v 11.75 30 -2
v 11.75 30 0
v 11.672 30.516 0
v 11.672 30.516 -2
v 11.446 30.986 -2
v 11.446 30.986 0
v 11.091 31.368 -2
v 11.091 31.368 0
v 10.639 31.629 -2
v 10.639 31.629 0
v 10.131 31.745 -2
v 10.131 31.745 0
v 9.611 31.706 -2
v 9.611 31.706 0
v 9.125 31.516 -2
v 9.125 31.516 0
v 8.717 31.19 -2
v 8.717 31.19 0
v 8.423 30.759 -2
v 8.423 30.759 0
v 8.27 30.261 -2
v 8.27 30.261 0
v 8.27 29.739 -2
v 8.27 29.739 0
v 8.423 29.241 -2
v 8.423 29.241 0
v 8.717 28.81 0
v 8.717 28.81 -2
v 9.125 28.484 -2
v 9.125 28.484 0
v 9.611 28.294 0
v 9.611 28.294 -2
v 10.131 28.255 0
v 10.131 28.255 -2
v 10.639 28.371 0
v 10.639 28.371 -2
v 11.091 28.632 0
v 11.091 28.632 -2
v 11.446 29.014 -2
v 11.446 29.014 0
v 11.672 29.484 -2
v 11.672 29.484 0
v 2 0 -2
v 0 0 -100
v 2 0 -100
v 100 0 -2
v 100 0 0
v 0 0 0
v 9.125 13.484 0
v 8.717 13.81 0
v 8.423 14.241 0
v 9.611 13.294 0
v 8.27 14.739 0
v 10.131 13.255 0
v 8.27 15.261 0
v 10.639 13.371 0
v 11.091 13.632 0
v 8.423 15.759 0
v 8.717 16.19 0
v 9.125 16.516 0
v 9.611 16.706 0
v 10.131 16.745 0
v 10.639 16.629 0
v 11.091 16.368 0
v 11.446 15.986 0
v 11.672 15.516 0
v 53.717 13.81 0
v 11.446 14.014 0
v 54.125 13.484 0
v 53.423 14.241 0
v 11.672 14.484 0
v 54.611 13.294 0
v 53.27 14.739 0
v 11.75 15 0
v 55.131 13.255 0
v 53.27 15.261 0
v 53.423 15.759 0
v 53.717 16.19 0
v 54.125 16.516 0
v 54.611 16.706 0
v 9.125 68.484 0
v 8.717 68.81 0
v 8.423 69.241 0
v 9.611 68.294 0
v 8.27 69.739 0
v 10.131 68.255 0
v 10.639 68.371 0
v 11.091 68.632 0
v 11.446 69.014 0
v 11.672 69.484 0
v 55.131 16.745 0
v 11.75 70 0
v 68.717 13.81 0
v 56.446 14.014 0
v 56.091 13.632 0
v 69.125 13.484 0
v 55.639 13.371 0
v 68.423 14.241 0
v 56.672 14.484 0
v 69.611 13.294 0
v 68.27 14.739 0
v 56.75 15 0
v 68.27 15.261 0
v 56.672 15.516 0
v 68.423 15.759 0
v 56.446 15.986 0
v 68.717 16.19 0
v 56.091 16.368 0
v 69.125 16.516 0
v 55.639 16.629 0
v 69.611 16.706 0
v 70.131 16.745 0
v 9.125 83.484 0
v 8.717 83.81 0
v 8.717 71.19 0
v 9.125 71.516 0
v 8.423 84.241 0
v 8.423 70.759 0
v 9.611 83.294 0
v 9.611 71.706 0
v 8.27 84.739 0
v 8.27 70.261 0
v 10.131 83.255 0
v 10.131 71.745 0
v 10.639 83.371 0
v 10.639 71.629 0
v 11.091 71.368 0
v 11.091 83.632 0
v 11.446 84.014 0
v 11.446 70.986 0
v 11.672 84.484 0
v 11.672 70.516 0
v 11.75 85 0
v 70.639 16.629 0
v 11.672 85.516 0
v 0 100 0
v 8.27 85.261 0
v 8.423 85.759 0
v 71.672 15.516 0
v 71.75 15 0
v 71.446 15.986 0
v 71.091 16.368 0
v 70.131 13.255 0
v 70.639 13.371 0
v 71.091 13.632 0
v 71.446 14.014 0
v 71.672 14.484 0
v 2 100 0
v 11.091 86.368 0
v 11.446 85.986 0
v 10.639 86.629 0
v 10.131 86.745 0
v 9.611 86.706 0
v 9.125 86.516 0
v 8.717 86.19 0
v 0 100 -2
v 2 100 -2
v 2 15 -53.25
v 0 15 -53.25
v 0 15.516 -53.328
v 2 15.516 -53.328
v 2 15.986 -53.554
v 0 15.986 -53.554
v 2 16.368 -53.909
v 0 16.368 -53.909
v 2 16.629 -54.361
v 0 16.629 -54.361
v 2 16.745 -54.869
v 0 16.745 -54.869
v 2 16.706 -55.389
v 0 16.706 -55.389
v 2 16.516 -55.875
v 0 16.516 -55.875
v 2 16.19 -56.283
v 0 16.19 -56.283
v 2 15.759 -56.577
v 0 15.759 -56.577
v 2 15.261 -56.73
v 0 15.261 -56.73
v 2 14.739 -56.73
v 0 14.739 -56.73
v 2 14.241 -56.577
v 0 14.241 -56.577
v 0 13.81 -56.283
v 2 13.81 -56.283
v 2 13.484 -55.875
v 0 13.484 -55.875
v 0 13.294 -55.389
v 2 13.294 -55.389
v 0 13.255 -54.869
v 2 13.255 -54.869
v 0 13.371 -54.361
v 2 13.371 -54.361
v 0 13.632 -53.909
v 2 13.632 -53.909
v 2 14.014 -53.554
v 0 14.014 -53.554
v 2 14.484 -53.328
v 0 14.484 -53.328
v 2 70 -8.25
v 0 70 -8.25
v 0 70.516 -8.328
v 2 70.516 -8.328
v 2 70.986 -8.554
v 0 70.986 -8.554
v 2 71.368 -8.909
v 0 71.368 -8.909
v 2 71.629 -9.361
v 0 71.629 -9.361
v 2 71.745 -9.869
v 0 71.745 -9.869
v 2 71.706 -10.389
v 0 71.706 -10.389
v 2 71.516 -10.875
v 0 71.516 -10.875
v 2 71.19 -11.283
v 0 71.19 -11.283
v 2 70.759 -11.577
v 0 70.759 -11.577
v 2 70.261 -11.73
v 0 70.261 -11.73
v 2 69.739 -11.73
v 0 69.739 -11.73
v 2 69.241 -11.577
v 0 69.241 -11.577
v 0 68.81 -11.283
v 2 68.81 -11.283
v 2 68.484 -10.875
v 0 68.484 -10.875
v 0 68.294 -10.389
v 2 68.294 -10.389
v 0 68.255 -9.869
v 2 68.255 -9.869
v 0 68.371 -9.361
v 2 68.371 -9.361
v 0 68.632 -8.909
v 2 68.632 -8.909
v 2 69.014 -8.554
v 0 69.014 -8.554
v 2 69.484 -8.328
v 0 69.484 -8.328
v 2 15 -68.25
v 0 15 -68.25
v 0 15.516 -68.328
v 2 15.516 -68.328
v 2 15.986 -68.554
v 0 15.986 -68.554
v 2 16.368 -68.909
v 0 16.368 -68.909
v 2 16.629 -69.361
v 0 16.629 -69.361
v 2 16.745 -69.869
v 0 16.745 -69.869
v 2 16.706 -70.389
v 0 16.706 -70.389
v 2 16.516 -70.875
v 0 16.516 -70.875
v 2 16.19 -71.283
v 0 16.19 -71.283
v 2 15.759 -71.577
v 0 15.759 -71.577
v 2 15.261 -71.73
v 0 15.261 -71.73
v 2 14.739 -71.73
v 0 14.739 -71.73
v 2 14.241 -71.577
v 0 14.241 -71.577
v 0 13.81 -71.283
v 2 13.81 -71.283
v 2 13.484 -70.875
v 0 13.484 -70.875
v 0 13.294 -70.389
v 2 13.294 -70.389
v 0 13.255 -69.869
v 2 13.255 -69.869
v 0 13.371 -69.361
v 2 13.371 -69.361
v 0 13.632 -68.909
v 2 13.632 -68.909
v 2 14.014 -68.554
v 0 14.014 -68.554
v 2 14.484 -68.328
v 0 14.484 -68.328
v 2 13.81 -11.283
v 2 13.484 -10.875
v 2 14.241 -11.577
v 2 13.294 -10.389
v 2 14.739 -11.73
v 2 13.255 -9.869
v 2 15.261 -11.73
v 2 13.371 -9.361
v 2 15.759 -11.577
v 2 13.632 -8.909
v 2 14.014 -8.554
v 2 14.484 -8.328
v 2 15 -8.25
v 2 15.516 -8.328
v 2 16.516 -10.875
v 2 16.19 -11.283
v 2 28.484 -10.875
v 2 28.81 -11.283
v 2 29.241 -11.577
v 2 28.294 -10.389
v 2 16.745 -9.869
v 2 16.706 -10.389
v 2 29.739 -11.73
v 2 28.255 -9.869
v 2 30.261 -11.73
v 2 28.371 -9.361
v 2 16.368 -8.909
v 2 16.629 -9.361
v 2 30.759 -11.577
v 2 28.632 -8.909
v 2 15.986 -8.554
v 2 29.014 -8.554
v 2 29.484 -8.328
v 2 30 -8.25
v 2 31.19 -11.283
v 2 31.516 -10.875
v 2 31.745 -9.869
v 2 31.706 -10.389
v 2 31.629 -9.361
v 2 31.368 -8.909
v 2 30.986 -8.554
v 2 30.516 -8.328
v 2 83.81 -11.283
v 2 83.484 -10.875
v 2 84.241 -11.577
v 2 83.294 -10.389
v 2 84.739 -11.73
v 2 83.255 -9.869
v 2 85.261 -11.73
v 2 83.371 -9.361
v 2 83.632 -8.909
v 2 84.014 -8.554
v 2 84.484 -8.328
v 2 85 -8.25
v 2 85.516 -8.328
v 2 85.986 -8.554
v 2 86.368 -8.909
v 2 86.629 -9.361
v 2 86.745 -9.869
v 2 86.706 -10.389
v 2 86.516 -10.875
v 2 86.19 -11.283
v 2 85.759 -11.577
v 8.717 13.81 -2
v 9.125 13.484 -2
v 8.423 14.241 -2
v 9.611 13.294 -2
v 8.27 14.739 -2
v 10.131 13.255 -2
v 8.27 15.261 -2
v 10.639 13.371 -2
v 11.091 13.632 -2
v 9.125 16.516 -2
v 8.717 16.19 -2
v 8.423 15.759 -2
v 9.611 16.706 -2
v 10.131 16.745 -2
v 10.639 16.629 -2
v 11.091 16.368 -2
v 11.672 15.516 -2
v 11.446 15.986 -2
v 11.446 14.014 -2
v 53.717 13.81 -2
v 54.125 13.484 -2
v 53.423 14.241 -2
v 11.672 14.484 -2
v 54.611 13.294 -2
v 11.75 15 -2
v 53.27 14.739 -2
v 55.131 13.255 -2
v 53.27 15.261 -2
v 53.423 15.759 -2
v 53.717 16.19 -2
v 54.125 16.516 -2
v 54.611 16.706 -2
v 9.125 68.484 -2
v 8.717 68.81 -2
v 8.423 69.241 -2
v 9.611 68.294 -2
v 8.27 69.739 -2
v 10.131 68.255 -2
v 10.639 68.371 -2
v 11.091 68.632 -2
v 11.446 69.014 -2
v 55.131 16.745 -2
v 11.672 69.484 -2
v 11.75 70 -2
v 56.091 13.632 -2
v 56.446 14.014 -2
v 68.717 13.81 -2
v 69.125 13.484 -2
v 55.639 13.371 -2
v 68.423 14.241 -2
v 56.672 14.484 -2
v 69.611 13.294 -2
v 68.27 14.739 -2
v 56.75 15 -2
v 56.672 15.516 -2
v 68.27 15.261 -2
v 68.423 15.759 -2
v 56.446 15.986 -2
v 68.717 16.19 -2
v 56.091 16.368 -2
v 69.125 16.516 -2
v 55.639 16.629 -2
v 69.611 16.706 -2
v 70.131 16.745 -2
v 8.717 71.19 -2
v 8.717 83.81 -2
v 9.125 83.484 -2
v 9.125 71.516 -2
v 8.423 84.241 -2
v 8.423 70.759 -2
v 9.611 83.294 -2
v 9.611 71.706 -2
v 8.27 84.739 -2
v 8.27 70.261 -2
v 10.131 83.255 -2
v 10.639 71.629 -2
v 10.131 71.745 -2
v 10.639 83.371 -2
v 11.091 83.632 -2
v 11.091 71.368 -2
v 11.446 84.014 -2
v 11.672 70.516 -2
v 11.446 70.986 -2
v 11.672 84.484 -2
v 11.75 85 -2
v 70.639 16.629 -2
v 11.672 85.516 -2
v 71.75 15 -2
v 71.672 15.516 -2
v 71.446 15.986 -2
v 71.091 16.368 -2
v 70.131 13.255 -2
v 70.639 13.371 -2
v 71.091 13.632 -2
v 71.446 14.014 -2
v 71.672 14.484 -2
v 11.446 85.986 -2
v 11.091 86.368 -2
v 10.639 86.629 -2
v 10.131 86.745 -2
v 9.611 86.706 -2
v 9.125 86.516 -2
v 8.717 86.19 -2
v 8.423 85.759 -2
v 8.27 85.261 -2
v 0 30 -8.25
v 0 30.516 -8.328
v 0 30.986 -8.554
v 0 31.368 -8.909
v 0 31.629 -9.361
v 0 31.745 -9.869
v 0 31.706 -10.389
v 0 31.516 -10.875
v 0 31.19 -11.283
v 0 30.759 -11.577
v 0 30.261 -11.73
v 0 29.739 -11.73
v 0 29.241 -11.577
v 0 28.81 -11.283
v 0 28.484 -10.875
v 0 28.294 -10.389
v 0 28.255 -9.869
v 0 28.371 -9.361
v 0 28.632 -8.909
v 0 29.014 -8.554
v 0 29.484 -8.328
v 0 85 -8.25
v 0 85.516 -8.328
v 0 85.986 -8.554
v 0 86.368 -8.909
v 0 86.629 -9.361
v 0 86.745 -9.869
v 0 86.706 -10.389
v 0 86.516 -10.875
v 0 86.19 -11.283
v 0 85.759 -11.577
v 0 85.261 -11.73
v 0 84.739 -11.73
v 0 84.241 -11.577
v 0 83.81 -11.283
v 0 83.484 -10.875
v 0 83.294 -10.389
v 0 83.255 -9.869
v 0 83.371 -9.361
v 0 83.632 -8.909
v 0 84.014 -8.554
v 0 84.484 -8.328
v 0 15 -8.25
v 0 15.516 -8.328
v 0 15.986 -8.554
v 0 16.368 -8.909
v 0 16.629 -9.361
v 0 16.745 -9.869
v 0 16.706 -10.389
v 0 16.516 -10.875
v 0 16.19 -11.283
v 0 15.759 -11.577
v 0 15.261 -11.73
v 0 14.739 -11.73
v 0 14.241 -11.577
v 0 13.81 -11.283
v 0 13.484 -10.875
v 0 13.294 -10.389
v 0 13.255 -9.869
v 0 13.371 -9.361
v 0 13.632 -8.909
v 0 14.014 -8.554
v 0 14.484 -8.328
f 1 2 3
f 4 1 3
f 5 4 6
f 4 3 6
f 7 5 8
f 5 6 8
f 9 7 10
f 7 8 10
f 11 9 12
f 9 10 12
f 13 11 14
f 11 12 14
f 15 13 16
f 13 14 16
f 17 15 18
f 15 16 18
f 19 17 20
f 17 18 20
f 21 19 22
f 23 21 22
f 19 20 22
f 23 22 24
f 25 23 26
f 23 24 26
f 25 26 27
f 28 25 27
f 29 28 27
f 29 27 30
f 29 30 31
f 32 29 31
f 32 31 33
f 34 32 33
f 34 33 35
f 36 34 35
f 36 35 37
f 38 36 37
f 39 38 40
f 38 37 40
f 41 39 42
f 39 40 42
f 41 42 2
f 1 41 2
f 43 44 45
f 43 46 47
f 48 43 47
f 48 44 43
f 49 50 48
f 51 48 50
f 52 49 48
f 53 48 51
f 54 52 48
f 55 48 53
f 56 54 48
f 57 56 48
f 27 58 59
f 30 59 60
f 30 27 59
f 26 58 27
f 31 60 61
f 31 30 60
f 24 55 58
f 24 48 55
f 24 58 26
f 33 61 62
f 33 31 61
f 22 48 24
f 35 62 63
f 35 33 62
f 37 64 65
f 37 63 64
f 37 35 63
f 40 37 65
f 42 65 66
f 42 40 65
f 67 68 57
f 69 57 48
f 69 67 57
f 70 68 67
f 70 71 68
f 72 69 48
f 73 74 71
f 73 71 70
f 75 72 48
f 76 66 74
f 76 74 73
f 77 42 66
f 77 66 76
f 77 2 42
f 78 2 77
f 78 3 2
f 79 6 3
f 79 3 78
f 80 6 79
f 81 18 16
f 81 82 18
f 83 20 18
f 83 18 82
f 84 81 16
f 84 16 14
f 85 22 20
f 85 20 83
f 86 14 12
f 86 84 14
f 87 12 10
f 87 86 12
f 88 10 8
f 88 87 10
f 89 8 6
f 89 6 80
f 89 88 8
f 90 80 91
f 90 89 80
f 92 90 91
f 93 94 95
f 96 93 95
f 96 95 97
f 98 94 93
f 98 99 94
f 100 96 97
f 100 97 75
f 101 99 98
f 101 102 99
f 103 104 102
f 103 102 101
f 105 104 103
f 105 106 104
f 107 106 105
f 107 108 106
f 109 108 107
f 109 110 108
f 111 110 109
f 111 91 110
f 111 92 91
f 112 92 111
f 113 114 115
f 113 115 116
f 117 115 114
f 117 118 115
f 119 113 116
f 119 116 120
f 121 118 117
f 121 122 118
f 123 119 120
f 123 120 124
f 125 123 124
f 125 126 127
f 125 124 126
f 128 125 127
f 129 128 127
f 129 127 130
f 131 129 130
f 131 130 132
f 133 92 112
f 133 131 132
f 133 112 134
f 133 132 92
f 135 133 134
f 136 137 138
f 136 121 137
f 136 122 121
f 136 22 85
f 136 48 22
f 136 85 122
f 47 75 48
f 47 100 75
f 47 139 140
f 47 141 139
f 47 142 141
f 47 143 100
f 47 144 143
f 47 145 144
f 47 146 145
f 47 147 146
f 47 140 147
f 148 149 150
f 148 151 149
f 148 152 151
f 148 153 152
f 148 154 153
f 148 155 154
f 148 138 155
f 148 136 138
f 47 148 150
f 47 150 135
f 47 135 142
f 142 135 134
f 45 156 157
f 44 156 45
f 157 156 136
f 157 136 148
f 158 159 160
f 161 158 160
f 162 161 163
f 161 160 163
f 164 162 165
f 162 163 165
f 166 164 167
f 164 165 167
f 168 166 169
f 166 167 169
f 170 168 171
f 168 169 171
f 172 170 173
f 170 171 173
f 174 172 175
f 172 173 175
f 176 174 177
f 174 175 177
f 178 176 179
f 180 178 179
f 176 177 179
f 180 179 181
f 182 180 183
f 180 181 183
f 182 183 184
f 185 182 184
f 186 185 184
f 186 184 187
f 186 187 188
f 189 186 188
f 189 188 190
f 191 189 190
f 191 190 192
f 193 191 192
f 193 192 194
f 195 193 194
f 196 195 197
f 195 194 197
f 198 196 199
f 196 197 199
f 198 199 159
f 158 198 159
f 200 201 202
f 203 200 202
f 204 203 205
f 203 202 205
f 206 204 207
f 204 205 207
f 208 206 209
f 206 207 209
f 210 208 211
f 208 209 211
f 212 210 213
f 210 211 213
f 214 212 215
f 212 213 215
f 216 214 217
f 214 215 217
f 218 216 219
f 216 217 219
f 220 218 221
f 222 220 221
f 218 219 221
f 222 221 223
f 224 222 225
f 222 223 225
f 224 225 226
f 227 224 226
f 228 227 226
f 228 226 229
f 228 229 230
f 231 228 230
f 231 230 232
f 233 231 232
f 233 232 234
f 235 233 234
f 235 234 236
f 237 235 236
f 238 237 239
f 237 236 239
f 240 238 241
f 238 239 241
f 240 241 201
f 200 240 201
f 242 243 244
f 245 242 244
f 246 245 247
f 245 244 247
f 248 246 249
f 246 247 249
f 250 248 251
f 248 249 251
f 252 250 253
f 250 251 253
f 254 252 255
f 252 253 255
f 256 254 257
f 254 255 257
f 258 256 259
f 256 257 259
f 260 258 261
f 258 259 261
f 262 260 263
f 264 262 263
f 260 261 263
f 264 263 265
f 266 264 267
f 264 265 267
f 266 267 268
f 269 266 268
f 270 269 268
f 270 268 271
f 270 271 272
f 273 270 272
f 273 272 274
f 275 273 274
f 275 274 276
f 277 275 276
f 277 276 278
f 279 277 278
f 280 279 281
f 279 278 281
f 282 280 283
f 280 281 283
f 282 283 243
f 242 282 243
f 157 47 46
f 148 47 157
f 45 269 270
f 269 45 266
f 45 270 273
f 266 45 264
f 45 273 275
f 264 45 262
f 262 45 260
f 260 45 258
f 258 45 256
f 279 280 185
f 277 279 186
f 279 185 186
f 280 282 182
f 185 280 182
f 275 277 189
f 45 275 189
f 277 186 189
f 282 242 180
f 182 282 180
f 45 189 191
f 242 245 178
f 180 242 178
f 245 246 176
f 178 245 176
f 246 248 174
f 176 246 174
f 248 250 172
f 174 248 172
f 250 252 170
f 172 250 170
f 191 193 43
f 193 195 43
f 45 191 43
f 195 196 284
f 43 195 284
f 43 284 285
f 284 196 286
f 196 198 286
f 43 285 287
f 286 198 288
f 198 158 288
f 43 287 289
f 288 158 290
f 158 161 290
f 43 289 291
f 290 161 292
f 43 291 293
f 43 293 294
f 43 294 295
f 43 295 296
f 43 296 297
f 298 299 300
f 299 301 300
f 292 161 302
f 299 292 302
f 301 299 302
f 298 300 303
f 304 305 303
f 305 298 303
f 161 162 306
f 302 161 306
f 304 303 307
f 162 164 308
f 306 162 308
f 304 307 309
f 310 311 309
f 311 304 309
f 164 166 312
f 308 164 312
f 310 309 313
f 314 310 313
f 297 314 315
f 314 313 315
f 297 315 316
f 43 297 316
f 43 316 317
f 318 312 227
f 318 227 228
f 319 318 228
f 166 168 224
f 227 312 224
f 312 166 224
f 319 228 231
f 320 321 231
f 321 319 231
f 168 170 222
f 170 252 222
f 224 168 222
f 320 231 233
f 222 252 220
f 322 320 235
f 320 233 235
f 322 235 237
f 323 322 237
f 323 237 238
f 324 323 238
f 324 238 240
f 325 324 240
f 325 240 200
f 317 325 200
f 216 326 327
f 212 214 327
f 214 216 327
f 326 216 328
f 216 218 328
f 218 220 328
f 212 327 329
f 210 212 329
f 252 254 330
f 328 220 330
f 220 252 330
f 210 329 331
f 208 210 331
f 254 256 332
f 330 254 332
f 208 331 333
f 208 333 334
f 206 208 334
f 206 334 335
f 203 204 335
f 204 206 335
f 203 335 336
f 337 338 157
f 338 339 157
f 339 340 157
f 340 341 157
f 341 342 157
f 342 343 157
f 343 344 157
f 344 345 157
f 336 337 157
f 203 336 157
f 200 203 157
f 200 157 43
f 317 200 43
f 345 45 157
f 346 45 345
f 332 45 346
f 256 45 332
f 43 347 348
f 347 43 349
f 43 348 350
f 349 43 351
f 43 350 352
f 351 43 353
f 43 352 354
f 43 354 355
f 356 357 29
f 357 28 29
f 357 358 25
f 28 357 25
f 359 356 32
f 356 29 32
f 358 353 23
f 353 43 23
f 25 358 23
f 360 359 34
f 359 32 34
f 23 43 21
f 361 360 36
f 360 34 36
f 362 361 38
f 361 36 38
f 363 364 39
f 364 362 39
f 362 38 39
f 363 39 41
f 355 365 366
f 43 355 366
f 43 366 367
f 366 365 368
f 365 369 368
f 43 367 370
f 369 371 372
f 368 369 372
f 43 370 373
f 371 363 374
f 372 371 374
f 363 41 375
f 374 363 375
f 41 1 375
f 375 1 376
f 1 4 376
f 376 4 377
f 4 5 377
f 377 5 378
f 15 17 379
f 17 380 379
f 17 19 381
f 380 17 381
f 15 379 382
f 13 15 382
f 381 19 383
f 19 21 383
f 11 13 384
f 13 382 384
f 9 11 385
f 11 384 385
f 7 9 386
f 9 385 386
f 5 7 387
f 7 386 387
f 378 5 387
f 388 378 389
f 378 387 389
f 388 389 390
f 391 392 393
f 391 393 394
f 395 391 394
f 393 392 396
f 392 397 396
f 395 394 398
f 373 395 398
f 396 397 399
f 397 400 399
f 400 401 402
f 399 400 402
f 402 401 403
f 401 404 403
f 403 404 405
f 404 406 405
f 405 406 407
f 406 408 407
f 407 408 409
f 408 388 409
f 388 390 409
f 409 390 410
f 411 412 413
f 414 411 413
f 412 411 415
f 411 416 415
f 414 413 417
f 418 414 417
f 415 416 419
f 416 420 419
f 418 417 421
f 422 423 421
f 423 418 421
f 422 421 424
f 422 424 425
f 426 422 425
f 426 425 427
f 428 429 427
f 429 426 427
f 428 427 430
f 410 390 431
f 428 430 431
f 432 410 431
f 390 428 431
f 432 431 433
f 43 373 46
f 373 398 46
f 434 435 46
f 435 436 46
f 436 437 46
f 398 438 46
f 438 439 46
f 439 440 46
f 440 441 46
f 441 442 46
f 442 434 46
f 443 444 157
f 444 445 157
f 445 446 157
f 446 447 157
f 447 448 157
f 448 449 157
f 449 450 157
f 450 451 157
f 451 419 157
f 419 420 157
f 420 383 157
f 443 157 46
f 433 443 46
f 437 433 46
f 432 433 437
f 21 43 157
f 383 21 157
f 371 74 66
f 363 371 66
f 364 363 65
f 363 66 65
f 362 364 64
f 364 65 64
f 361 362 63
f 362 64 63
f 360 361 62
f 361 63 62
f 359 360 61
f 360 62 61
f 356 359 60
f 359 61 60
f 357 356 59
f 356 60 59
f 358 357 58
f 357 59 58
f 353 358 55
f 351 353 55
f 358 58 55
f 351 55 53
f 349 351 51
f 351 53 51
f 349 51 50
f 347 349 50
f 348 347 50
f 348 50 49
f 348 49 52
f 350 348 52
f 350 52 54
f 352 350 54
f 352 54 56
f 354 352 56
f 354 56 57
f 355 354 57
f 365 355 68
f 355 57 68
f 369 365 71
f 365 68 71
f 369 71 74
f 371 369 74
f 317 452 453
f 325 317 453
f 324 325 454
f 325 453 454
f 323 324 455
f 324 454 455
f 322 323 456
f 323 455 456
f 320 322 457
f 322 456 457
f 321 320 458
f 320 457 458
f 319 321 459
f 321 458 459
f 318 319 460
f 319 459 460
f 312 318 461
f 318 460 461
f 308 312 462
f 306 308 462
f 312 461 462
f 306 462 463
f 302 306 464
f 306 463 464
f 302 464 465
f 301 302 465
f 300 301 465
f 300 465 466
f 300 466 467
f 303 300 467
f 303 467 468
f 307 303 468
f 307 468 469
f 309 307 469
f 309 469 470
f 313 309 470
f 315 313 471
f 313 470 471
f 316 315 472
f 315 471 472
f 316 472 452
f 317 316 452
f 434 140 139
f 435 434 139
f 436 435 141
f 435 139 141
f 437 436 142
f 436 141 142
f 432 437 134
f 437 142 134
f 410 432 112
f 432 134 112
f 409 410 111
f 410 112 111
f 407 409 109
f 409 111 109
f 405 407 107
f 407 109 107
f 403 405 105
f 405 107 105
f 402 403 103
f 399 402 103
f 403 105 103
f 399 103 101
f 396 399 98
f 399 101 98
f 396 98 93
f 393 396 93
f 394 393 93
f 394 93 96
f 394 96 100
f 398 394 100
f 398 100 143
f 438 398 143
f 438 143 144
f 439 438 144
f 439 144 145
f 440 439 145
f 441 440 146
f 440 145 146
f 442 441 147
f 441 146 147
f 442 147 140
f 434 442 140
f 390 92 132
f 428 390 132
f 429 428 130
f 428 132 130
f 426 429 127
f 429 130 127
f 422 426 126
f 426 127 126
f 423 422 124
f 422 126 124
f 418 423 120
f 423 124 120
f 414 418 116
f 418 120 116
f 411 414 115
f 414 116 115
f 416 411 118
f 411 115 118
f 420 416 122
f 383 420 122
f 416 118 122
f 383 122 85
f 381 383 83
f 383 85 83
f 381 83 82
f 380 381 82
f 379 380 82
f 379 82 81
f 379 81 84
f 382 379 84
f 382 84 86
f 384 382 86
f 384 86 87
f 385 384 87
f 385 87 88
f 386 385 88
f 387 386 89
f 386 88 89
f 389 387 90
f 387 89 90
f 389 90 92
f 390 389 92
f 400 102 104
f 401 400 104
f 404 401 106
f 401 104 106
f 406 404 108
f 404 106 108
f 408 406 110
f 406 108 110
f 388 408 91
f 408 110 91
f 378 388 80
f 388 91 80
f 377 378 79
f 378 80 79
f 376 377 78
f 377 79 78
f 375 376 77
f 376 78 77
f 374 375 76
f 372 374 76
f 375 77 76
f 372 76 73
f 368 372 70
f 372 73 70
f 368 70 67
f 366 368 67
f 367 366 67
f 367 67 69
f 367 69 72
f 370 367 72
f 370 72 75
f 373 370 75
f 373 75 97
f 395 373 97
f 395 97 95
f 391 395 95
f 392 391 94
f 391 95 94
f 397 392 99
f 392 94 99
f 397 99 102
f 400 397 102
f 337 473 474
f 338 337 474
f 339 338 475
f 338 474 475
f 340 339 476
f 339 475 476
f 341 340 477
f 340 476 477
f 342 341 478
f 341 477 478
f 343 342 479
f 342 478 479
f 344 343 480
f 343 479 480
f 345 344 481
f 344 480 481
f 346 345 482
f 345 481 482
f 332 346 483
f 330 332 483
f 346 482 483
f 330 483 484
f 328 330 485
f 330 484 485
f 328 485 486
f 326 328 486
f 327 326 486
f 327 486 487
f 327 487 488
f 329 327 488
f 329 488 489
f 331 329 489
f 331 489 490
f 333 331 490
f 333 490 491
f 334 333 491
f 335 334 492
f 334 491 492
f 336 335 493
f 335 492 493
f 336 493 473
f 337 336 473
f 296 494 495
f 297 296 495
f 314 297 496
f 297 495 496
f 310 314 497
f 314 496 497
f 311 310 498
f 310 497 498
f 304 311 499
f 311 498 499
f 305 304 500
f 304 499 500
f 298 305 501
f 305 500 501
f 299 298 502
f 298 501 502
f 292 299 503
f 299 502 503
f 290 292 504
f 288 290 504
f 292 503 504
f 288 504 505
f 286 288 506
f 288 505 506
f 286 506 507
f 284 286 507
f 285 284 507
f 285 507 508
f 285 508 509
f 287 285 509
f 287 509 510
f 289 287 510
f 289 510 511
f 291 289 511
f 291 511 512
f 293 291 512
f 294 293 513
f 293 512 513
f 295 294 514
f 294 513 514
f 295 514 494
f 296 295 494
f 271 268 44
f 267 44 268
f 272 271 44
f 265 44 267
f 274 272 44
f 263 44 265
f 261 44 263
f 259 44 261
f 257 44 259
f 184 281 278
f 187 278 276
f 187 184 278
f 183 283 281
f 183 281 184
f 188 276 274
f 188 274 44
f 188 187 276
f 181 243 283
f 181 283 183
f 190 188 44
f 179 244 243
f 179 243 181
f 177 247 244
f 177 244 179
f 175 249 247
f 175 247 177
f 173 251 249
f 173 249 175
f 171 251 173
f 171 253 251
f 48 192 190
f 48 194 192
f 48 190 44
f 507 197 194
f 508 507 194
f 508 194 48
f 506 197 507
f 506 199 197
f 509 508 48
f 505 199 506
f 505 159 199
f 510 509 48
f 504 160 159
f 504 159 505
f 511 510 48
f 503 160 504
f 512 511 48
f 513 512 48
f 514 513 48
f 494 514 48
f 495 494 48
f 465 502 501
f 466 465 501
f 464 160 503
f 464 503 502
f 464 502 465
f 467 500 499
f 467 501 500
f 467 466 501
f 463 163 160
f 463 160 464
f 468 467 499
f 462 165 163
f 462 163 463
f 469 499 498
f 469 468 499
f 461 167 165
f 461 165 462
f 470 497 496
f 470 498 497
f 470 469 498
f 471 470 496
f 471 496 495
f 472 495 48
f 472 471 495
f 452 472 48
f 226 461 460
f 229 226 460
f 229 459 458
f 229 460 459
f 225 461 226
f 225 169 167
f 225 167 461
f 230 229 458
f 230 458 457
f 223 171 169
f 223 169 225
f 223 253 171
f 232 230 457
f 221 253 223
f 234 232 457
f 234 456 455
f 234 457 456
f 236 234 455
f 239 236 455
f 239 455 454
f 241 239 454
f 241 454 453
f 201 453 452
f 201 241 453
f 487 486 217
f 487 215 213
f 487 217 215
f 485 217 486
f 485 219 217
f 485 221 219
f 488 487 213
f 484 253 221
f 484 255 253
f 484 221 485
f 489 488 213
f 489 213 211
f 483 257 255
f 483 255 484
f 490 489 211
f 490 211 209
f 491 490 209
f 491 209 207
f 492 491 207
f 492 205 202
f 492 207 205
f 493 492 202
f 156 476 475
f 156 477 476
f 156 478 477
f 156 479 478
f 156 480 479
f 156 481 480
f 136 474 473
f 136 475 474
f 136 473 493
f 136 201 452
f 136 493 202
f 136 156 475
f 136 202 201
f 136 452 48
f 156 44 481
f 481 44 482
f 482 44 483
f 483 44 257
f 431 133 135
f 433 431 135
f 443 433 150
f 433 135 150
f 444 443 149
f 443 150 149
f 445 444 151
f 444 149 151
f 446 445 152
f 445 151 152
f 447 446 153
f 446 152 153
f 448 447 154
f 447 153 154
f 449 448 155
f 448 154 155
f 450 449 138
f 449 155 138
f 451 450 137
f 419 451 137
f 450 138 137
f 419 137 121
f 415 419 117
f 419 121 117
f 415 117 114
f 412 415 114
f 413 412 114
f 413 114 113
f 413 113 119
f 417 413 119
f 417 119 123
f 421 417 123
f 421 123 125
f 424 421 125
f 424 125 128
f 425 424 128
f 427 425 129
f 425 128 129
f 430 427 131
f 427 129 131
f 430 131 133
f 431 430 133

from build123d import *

# Parameters (mm, degrees)
ESBO_O1_W                = 2
ESBO_O1_H                = 2
RESSALTO_EXTRUS_O1_DEPTH = 100
RESSALTO_EXTRUS_O2_DEPTH = 2
RESSALTO_EXTRUS_O3_DEPTH = 2
ESBO_O4_R                = 1.75
CORTE_EXTRUS_O1_DEPTH    = 2
ESBO_O5_R                = 1.75
CORTE_EXTRUS_O2_DEPTH    = 2


with BuildPart() as part:
    # Esboço1 → Ressalto-extrusão1 (new body)
    with BuildSketch(Plane(origin=(0, 0, 0), x_dir=(1, 0, 0), z_dir=(0, 1, 0))):
        with Locations((1, 1)):
            Rectangle(ESBO_O1_W, ESBO_O1_H)
    extrude(amount=RESSALTO_EXTRUS_O1_DEPTH)

    # Esboço2 → Ressalto-extrusão2 (add)
    with BuildSketch(Plane.XY):
        Polygon((2, 0), (100, 0), (2, 100), align=None)
    extrude(amount=-RESSALTO_EXTRUS_O2_DEPTH)

    # Esboço3 → Ressalto-extrusão3 (add)
    with BuildSketch(Plane.ZY):
        Polygon((-2, 0), (-2, 100), (-100, 0), align=None)
    extrude(amount=-RESSALTO_EXTRUS_O3_DEPTH)

    # Esboço4 → Corte-extrusão1 (cut)
    with BuildSketch(Plane.ZY):
        with Locations((-10, 15)):
            Circle(ESBO_O4_R)
        with Locations((-10, 30)):
            Circle(ESBO_O4_R)
        with Locations((-10, 85)):
            Circle(ESBO_O4_R)
        with Locations((-10, 70)):
            Circle(ESBO_O4_R)
        with Locations((-55, 15)):
            Circle(ESBO_O4_R)
        with Locations((-70, 15)):
            Circle(ESBO_O4_R)
    extrude(amount=-CORTE_EXTRUS_O1_DEPTH, mode=Mode.SUBTRACT)

    # Esboço5 → Corte-extrusão2 (cut)
    with BuildSketch(Plane.XY):
        with Locations((10, 15)):
            Circle(ESBO_O5_R)
        with Locations((10, 30)):
            Circle(ESBO_O5_R)
        with Locations((10, 85)):
            Circle(ESBO_O5_R)
        with Locations((10, 70)):
            Circle(ESBO_O5_R)
        with Locations((70, 15)):
            Circle(ESBO_O5_R)
        with Locations((55, 15)):
            Circle(ESBO_O5_R)
    extrude(amount=-CORTE_EXTRUS_O2_DEPTH, mode=Mode.SUBTRACT)


solid = part.part
